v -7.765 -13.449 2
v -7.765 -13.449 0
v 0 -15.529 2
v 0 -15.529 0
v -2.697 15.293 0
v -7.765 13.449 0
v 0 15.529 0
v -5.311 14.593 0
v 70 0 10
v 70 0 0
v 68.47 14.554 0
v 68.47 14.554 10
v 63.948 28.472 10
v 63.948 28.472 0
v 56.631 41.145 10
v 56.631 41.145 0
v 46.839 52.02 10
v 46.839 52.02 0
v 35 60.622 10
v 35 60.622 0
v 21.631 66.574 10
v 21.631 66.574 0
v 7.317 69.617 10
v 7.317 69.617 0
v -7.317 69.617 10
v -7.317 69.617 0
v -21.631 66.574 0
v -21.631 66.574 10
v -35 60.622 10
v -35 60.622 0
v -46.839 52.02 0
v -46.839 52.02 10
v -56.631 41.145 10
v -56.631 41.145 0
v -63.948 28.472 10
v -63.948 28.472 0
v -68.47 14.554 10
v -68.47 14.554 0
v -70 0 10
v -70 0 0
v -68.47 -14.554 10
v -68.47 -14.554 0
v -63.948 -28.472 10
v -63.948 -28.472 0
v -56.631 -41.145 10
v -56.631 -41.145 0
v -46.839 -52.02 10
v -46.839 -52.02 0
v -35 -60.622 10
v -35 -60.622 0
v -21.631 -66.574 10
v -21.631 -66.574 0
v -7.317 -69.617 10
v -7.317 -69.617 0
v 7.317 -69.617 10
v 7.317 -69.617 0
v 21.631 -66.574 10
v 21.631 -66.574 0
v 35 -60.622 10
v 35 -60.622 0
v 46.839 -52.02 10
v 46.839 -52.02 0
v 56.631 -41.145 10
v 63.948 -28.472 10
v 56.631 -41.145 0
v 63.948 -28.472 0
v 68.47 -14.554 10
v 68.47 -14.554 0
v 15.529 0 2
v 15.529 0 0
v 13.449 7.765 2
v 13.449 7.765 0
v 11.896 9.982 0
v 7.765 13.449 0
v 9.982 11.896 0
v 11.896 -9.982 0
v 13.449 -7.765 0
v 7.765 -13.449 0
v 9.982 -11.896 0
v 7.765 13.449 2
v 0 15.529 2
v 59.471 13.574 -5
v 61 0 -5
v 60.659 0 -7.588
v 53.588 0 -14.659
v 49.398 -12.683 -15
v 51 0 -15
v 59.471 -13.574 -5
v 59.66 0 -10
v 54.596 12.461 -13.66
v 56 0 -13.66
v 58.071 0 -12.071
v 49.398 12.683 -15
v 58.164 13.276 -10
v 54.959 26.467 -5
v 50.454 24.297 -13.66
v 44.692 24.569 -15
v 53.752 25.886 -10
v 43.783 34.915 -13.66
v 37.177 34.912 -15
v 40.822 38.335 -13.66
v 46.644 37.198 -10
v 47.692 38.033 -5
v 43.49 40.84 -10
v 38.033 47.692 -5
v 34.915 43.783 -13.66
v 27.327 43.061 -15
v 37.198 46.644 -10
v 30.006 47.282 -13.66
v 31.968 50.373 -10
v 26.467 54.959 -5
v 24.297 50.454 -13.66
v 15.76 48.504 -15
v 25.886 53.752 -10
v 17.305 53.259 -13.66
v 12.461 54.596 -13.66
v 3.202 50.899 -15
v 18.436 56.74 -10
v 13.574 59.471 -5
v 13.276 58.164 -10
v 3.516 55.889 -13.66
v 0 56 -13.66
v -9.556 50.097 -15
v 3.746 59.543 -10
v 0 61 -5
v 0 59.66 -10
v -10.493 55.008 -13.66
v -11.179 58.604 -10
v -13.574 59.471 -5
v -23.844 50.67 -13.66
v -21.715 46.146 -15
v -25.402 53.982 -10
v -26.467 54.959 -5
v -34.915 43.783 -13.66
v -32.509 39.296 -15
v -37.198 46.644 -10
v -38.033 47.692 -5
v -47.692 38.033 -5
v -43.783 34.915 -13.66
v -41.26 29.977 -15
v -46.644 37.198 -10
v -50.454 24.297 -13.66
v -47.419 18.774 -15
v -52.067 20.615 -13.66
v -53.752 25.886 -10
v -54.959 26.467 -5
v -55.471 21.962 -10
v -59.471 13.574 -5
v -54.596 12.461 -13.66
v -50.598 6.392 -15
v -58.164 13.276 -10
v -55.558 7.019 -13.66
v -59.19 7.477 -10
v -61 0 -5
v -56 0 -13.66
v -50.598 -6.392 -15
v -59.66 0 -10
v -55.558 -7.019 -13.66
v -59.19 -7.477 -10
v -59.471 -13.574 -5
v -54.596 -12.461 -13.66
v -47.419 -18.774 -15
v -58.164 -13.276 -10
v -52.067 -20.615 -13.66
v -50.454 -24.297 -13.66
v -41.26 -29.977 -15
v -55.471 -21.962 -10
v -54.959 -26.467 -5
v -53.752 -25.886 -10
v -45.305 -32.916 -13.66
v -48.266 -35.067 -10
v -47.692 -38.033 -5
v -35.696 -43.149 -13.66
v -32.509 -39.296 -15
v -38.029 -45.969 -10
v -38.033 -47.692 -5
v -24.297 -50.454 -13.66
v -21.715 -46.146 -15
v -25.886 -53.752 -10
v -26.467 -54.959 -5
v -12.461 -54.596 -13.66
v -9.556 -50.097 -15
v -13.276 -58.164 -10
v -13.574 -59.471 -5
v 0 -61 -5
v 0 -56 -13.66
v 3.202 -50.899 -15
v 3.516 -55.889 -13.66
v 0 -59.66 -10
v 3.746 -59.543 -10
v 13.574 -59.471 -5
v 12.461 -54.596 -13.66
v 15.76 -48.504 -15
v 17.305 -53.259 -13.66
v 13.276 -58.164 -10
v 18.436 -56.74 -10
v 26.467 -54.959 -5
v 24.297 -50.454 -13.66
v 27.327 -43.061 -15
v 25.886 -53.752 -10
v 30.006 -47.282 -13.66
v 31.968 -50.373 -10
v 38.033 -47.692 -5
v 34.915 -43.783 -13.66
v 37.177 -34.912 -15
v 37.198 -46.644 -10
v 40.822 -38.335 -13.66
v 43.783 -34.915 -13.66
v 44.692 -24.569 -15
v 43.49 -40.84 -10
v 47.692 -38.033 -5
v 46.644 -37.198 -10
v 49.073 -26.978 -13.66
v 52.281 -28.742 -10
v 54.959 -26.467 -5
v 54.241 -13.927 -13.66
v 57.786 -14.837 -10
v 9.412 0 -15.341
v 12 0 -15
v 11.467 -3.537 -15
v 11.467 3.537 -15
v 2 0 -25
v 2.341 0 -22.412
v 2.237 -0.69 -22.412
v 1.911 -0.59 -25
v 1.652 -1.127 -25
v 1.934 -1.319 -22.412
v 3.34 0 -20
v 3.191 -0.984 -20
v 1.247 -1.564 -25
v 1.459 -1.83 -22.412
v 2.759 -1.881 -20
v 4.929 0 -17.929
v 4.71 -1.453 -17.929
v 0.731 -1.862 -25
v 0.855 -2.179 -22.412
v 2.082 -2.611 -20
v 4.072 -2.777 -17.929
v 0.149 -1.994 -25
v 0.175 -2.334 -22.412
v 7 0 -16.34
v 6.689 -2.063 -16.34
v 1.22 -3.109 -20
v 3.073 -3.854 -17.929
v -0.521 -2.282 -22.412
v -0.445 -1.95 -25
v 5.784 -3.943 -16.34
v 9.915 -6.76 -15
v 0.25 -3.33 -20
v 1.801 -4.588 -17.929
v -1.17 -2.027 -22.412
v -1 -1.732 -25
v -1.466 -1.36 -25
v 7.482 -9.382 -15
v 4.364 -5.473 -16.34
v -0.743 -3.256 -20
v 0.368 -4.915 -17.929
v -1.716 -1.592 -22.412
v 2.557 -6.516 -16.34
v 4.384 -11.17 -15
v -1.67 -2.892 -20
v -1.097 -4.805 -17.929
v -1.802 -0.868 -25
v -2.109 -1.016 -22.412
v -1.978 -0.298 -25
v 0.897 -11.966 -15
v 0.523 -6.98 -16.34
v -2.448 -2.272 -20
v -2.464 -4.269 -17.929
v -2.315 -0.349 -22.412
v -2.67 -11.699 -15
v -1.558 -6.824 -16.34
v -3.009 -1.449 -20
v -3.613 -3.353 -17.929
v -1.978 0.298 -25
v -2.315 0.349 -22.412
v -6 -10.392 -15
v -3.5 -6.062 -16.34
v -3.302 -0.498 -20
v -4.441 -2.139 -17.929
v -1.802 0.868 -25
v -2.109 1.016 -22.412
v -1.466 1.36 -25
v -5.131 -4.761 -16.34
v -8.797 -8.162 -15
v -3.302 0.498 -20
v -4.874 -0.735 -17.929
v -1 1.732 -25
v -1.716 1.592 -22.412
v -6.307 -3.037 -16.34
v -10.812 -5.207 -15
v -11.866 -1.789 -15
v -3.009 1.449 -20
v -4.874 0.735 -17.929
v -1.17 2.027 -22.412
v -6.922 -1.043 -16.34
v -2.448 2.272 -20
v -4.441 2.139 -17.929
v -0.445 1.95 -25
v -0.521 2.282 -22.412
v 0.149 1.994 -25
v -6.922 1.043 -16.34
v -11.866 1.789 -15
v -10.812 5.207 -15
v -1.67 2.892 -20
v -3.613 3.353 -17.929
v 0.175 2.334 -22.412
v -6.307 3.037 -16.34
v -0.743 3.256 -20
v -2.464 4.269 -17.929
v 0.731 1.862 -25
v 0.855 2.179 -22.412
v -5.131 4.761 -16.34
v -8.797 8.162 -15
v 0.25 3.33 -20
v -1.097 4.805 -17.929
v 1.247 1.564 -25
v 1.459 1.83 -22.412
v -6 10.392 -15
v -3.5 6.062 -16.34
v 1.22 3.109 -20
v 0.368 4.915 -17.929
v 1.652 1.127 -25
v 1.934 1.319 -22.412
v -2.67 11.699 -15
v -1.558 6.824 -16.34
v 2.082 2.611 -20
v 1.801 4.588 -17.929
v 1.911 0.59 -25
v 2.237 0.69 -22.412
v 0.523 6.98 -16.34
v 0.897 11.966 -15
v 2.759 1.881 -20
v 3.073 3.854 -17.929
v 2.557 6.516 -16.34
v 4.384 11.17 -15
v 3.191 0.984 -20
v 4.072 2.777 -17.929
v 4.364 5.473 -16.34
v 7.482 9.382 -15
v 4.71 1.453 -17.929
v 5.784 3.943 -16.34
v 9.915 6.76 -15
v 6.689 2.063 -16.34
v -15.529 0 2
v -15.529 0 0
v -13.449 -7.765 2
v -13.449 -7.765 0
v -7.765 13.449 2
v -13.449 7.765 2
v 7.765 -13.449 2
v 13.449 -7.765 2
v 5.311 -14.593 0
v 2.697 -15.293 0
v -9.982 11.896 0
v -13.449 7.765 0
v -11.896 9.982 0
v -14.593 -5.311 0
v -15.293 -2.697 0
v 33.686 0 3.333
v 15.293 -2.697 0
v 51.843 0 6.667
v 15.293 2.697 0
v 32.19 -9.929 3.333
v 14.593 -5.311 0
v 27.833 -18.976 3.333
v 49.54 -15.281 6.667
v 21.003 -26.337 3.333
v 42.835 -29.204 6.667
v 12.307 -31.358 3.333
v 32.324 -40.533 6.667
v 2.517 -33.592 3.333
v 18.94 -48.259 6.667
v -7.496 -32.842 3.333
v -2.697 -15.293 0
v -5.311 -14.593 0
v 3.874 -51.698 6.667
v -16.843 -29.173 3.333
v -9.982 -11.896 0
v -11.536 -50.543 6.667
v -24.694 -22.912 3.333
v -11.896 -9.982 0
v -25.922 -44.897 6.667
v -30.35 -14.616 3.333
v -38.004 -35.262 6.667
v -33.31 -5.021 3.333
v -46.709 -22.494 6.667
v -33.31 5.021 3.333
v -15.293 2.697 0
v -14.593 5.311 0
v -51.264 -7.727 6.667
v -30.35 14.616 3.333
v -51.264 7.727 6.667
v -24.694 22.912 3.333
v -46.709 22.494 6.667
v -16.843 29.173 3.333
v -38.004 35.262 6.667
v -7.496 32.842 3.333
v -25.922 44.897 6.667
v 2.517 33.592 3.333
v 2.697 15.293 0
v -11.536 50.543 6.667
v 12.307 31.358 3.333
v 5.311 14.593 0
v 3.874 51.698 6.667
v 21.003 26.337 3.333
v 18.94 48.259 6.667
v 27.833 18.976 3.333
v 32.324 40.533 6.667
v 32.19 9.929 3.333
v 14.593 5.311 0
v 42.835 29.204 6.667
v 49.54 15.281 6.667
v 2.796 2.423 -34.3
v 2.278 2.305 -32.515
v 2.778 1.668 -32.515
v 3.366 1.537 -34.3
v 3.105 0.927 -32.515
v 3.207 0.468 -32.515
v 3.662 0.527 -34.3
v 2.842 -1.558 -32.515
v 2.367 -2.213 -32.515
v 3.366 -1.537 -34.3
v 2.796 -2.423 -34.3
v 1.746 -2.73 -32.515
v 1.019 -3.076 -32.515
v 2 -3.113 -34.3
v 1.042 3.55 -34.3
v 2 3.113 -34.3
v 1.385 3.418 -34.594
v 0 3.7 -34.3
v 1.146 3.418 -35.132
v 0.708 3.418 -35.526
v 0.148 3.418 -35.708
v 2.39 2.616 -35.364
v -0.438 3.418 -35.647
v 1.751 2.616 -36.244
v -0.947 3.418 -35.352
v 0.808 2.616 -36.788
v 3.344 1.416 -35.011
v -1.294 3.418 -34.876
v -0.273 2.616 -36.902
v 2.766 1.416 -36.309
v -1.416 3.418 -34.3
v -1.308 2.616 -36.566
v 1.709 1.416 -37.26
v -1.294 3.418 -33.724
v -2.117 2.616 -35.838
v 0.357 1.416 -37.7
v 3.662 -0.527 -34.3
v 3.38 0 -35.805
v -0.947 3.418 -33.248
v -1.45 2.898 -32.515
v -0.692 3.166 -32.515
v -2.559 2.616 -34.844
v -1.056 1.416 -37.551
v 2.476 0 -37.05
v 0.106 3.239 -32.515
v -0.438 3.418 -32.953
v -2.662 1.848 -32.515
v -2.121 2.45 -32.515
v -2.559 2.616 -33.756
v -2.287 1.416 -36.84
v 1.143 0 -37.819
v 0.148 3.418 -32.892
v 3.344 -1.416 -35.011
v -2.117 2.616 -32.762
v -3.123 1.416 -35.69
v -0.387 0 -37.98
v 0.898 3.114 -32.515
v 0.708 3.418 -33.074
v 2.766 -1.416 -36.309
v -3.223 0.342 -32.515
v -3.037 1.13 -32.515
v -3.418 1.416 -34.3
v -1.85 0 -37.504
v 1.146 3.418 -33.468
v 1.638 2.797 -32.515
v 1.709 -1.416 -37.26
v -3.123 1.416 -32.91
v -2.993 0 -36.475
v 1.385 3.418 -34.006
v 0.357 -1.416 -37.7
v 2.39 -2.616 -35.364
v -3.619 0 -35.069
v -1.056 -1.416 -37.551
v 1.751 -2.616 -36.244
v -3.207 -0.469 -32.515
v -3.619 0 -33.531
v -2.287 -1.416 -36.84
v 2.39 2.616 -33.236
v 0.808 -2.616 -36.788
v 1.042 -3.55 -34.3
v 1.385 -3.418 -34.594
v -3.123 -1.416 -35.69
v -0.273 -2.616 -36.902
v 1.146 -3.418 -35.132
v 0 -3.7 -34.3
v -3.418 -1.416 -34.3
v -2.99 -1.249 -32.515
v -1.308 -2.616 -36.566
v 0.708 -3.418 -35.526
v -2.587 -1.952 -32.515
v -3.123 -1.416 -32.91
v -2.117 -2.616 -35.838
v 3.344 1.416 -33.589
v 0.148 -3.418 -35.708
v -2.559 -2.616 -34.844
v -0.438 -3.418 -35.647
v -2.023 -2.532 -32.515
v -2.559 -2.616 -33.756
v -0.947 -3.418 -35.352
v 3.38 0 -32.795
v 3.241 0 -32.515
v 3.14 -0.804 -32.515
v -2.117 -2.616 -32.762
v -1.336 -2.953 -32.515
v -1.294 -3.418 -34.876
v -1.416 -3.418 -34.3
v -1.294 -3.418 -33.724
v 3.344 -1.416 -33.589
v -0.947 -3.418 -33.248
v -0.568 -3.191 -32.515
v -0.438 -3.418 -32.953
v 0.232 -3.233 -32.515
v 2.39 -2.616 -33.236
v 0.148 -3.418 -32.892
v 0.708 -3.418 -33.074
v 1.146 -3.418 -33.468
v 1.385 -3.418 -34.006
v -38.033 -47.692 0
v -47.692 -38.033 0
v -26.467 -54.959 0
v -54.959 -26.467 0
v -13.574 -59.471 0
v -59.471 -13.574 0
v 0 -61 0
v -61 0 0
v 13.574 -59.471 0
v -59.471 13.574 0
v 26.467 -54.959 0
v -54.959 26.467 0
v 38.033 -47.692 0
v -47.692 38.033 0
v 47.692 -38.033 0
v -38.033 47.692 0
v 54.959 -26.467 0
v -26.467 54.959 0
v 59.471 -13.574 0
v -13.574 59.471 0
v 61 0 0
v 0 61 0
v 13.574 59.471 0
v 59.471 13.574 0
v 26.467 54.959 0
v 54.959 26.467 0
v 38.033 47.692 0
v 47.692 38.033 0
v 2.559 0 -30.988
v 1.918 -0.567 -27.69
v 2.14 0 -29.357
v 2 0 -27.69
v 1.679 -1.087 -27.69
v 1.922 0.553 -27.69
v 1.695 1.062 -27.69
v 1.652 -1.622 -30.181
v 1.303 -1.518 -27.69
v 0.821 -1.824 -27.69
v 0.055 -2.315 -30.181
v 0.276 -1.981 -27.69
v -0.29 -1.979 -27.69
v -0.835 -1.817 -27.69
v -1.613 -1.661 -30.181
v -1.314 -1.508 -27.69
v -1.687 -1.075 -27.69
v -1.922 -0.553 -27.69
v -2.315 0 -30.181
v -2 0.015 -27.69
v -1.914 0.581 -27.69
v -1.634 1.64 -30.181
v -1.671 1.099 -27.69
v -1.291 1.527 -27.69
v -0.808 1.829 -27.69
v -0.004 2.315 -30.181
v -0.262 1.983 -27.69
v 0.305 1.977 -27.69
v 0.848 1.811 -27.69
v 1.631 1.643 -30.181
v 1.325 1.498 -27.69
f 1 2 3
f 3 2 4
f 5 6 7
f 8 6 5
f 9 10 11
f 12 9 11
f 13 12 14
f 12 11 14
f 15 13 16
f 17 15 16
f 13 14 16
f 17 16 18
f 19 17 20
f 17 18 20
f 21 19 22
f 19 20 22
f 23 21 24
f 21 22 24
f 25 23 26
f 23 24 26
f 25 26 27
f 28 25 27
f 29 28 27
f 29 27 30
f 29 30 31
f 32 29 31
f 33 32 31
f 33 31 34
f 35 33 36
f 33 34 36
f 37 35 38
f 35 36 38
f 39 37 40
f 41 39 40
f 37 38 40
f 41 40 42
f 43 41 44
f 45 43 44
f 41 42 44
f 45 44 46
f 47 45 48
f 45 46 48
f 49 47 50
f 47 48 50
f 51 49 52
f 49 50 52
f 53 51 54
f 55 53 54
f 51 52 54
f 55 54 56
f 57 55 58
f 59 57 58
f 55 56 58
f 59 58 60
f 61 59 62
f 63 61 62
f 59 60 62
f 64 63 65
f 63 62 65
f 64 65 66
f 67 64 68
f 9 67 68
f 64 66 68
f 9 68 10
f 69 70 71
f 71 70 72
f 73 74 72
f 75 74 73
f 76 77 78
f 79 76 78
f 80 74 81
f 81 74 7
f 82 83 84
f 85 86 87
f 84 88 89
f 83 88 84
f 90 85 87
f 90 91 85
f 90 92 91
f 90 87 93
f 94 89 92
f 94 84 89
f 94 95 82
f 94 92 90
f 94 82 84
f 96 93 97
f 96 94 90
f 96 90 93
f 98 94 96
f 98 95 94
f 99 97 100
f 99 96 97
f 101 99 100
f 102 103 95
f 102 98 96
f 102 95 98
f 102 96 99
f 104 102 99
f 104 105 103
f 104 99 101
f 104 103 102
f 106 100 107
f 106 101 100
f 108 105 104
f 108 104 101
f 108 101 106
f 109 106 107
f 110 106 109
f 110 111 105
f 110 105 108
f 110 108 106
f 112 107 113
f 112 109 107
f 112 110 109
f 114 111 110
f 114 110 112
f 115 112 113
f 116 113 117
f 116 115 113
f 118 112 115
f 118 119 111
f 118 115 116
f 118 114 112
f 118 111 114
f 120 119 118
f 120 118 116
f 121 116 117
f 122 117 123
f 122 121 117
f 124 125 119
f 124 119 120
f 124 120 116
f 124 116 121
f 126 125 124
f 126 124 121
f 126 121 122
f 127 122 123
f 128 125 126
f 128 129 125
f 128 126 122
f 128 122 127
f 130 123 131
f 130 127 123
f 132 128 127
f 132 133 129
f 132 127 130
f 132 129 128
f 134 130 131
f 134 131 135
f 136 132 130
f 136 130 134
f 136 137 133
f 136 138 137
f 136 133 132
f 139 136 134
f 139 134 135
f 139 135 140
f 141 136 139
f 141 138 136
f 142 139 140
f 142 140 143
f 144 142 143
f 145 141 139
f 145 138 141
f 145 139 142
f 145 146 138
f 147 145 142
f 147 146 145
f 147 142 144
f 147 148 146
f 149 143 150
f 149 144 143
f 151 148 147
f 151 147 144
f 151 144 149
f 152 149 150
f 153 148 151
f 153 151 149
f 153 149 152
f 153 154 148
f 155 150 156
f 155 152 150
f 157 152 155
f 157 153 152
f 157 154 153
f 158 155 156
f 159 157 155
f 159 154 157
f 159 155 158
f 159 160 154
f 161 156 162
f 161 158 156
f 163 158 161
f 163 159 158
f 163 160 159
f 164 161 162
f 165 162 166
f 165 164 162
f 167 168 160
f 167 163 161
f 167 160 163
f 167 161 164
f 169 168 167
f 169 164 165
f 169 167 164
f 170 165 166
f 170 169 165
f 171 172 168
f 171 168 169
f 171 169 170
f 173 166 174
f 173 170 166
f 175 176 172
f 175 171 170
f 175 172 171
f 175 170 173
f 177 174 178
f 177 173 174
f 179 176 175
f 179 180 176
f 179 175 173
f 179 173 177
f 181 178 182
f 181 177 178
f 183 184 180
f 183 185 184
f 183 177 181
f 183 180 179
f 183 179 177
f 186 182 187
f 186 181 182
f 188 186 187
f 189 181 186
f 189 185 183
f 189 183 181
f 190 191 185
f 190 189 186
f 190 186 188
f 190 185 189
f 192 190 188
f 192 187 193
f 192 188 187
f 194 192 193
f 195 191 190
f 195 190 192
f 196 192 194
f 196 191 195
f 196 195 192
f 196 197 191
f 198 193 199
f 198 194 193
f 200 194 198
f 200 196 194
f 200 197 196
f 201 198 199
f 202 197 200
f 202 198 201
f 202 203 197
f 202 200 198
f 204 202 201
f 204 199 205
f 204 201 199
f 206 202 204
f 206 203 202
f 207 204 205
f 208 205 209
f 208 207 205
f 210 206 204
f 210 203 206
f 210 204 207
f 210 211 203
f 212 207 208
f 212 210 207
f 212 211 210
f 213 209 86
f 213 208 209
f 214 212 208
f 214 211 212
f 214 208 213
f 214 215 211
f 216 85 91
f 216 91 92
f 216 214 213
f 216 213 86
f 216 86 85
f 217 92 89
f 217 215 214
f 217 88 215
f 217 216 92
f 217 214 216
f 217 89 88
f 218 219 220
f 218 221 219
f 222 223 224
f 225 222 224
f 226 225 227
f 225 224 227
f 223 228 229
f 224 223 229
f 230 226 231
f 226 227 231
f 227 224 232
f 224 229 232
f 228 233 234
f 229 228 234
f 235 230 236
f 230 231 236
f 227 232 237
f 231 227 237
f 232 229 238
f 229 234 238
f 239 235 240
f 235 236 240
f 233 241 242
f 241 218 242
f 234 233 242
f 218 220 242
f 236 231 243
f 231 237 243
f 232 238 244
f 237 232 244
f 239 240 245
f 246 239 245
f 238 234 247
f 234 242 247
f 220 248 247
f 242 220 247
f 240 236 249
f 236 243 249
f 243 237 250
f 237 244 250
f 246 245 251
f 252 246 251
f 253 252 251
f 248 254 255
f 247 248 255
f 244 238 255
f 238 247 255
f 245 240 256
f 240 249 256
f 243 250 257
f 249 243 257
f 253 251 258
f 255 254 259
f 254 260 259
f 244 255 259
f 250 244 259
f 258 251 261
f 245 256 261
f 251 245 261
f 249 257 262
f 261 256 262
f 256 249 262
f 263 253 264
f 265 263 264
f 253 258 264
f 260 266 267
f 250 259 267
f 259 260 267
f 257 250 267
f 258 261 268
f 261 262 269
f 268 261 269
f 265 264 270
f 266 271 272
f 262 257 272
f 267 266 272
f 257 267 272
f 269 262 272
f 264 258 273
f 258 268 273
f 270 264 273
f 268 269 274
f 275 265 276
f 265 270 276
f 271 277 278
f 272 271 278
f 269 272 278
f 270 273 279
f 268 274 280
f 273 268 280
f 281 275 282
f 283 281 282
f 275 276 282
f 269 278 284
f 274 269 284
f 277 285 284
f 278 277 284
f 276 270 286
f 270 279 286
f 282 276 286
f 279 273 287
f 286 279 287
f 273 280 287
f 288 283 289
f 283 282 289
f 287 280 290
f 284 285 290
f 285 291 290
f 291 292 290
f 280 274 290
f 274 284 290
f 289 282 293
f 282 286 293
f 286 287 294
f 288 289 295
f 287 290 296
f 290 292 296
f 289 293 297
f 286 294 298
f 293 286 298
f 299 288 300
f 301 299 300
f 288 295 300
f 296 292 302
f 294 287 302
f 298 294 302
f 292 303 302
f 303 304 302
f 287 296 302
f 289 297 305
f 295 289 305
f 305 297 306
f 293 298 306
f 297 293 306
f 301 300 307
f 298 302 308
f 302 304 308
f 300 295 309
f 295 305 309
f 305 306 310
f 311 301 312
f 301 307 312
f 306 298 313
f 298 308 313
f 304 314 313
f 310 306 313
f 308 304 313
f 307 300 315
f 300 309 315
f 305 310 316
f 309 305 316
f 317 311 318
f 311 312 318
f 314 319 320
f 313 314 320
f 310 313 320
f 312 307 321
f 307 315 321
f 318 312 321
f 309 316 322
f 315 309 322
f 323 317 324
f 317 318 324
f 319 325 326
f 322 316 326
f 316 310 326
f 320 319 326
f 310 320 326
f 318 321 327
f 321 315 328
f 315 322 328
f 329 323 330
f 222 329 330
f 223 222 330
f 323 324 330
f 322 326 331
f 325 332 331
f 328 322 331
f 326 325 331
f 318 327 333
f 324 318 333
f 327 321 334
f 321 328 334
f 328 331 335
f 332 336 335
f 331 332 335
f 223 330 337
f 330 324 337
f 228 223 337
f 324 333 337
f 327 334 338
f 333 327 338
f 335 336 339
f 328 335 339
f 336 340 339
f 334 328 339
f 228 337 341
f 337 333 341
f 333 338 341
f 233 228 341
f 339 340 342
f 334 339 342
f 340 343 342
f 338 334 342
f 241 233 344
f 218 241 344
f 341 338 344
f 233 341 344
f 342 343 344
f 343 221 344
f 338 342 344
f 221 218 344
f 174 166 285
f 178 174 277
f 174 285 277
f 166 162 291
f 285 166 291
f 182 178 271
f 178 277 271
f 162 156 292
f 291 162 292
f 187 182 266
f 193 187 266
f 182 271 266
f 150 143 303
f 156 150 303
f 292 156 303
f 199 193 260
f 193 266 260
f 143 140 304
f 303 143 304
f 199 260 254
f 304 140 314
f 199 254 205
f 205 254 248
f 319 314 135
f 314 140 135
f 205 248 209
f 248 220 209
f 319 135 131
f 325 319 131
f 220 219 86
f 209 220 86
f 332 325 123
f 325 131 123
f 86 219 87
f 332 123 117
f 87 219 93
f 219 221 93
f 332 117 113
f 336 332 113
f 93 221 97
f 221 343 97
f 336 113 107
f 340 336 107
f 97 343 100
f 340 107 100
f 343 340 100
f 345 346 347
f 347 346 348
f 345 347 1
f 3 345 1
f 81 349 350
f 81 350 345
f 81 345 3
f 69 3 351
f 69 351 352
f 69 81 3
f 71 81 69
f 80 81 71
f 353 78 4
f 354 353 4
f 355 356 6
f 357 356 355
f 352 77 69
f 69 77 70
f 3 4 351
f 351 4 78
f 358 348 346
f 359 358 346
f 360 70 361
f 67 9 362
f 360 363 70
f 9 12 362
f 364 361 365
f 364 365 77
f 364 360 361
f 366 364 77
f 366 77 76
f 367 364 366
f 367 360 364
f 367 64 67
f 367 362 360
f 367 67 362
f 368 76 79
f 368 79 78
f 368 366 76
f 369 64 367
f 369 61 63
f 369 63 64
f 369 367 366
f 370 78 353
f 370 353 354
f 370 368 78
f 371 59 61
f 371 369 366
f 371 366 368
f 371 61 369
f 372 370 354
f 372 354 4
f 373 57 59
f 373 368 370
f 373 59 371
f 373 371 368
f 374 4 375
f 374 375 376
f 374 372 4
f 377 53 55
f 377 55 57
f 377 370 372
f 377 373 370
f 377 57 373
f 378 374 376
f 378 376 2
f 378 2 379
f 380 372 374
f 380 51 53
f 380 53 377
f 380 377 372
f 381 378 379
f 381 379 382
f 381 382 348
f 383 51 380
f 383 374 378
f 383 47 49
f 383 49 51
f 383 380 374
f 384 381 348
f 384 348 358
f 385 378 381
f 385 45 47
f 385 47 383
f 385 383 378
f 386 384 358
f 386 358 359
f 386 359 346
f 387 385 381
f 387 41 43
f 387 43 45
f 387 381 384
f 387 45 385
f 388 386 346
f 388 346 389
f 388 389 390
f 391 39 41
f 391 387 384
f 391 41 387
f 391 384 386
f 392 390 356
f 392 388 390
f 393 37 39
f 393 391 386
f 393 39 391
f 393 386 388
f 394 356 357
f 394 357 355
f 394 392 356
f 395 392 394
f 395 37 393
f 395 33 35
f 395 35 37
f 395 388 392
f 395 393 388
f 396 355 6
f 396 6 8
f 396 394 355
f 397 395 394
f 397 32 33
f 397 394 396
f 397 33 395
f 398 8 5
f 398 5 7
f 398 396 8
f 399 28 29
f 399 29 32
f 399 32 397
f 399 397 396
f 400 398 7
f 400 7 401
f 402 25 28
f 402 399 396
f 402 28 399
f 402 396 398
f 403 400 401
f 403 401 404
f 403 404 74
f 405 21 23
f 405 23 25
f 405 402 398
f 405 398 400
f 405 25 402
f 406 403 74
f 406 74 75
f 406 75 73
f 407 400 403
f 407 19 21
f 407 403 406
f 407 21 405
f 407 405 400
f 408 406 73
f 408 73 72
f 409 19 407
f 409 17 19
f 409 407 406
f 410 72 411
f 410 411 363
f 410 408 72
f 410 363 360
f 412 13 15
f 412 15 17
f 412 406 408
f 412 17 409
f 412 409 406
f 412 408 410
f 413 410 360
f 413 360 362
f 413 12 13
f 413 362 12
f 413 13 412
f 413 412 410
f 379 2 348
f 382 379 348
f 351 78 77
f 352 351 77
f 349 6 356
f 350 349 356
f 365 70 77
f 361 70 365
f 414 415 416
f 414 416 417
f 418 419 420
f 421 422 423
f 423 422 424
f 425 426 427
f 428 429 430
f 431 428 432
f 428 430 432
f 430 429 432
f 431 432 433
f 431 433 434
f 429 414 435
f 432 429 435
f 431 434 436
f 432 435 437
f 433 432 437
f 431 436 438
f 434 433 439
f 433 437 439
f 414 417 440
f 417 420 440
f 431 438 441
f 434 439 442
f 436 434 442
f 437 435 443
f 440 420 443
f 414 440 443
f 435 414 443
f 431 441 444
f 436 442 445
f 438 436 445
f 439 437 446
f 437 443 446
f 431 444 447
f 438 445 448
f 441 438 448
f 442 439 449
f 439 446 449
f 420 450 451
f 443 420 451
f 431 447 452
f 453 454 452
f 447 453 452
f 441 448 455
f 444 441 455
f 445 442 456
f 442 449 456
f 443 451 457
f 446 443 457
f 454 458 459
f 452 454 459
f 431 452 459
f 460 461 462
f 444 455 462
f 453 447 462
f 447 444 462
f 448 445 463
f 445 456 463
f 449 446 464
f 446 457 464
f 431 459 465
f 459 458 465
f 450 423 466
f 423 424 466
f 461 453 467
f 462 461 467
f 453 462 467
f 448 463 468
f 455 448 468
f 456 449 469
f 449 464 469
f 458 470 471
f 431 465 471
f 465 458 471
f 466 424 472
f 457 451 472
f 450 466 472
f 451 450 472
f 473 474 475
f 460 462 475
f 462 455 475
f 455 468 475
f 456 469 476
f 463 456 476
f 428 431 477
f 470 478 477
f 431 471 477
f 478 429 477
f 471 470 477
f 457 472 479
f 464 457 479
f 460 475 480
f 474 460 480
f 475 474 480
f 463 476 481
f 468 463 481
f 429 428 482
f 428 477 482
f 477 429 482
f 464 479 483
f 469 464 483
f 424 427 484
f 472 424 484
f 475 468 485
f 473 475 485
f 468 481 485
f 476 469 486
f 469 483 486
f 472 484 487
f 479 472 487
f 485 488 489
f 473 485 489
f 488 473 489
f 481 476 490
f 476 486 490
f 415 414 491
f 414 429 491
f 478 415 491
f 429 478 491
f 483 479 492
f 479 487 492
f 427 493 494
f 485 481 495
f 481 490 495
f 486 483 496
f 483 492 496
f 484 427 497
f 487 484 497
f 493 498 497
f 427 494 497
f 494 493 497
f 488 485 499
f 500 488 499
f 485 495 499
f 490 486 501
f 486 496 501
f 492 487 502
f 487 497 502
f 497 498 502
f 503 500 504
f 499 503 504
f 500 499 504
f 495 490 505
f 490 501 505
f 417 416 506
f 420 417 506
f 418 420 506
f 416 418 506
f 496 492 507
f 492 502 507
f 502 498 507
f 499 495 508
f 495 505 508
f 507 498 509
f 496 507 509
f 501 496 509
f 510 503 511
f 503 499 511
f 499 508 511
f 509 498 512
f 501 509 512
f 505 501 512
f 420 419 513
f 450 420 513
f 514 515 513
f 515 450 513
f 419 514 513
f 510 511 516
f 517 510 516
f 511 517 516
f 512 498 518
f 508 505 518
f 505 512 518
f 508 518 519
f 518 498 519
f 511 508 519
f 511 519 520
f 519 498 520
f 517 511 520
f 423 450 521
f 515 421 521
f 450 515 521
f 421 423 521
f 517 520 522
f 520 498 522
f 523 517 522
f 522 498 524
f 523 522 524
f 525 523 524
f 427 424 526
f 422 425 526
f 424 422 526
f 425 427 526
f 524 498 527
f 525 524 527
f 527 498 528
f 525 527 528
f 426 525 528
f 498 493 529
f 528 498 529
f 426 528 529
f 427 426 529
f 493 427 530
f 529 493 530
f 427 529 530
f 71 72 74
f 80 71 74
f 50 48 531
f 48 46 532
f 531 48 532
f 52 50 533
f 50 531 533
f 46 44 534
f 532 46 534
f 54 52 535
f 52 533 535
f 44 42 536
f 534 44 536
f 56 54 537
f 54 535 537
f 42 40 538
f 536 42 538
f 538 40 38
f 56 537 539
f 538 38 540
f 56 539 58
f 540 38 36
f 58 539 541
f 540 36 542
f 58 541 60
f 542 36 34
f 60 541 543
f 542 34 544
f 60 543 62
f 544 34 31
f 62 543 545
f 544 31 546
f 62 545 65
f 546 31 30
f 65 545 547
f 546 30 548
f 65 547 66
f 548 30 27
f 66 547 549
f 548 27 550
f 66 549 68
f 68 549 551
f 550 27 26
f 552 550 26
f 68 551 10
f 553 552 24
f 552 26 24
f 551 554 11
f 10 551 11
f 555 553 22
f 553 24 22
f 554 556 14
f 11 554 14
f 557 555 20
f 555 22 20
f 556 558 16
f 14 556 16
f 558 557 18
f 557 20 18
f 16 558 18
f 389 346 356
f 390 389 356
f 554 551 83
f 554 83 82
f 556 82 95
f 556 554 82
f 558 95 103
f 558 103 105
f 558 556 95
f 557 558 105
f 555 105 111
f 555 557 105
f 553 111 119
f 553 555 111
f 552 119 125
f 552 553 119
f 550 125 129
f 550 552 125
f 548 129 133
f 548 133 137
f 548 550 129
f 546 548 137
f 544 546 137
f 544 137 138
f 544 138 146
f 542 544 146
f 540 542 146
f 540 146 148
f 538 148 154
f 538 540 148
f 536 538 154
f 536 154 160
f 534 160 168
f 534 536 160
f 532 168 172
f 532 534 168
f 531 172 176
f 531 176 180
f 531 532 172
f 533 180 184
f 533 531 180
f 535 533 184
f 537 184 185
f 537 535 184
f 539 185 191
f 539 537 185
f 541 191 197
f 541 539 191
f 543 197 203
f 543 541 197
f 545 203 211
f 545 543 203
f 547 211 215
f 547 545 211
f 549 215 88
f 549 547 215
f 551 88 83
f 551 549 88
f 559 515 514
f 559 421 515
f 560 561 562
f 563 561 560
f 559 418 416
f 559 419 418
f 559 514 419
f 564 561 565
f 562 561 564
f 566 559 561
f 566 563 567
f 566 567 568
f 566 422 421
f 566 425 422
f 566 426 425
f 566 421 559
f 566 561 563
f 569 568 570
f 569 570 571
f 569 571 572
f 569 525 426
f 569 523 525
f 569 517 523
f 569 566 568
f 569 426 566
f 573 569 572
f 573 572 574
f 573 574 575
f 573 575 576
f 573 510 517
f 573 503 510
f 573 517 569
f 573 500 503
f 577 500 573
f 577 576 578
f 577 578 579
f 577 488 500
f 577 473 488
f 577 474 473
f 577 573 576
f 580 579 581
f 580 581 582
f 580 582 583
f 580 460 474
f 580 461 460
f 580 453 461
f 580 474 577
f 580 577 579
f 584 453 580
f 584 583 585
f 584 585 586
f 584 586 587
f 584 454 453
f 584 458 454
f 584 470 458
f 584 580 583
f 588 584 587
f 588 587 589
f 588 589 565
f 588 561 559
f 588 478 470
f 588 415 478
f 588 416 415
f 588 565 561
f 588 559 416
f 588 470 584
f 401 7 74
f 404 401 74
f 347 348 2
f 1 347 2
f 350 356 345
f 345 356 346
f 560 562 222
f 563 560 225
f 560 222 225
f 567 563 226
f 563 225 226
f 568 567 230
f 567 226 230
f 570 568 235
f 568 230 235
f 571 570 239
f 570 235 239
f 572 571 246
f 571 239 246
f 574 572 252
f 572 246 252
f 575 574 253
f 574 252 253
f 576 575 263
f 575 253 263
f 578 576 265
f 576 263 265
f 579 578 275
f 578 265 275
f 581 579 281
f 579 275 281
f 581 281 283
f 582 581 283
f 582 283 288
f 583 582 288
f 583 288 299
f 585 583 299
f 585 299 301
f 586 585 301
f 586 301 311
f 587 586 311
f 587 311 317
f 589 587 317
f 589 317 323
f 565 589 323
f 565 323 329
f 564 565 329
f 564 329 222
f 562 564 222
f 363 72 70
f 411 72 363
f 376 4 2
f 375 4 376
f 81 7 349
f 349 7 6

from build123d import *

# Parameters (mm, degrees)
SKETCH2_R           = 70
BOSS_EXTRUDE2_DEPTH = 10
SKETCH3_R           = 61
BOSS_EXTRUDE3_DEPTH = 15
CUT_EXTRUDE2_DEPTH  = 10
SKETCH10_W          = 15.529142706
SKETCH10_H          = 10
BOSS_EXTRUDE4_DEPTH = 2
SKETCH19_R          = 2
BOSS_EXTRUDE5_DEPTH = 16.7
FILLET1_R           = 10


with BuildPart() as part:
    # Sketch2 → Boss-Extrude2 (new body)
    with BuildSketch(Plane.XY):
        Circle(SKETCH2_R)
    extrude(amount=BOSS_EXTRUDE2_DEPTH)

    # Sketch3 → Boss-Extrude3 (add)
    with BuildSketch(Plane.XY):
        Circle(SKETCH3_R)
    extrude(amount=-BOSS_EXTRUDE3_DEPTH)

    # Sketch9 → Cut-Extrude2 (cut)
    with BuildSketch(Plane.XY.offset(10)):
        Polygon((0, 15.529142706), (-7.764571353, 13.448632083), (-13.448632083, 7.764571353), (-15.529142706, 0), (-13.448632083, -7.764571353), (-7.764571353, -13.448632083), (0, -15.529142706), (7.764571353, -13.448632083), (13.448632083, -7.764571353), (15.529142706, 0), (13.448632083, 7.764571353), (7.764571353, 13.448632083), align=None)
    extrude(amount=-CUT_EXTRUDE2_DEPTH, mode=Mode.SUBTRACT)

    # Sketch10 → Cut-Revolve7 (revolve, cut)
    with BuildSketch(Plane(origin=(0, 0, 0), x_dir=(1, 0, 0), z_dir=(0, 1, 0)), mode=Mode.PRIVATE) as cut_revolve7_sk:
        Polygon((-70, -10), (-15.529142706, -10), (-15.529142706, 0), align=None)
        with Locations((-7.764571353, -5)):
            Rectangle(SKETCH10_W, SKETCH10_H)
    revolve(cut_revolve7_sk.sketch.rotate(Axis((0, 0, 10), (0, 0, -1)), 180), axis=Axis((0, 0, 10), (0, 0, -1)), mode=Mode.SUBTRACT)

    # Sketch14 → Boss-Extrude4 (add)
    with BuildSketch(Plane.XY):
        Polygon((0, 15.529142706), (-7.764571353, 13.448632083), (-13.448632083, 7.764571353), (-15.529142706, 0), (-13.448632083, -7.764571353), (-7.764571353, -13.448632083), (0, -15.529142706), (7.764571353, -13.448632083), (13.448632083, -7.764571353), (15.529142706, 0), (13.448632083, 7.764571353), (7.764571353, 13.448632083), align=None)
    extrude(amount=BOSS_EXTRUDE4_DEPTH)

    # Sketch19 → Boss-Extrude5 (add)
    with BuildSketch(Plane(origin=(0, 0, -15), x_dir=(-1, 0, 0), z_dir=(0, 0, -1))):
        with Locations(Location((0, 0, 0), (0, 0, 180))):
            Circle(SKETCH19_R)
    extrude(amount=BOSS_EXTRUDE5_DEPTH)

    # Sketch22 → Revolve2 (revolve)
    with BuildSketch(Plane(origin=(0, 0, -34.3), x_dir=(-1, 0, 0), z_dir=(0, 0, -1))):
        with BuildLine():
            Line((0, -3.7), (0, 3.7))
            ThreePointArc((0, 3.7), (-3.7, 0), (0, -3.7))
        make_face()
    revolve(axis=Axis((0, -3.7, -34.3), (0, 1, 0)))

    # Fillet1
    fillet1_edges = [part.edges().sort_by_distance(p)[0] for p in [
        (-2, 0, -15),
        (-2, 0, -31.187123517),
        (-61, 0, -15),
    ]]
    fillet(fillet1_edges, radius=FILLET1_R)


solid = part.part
